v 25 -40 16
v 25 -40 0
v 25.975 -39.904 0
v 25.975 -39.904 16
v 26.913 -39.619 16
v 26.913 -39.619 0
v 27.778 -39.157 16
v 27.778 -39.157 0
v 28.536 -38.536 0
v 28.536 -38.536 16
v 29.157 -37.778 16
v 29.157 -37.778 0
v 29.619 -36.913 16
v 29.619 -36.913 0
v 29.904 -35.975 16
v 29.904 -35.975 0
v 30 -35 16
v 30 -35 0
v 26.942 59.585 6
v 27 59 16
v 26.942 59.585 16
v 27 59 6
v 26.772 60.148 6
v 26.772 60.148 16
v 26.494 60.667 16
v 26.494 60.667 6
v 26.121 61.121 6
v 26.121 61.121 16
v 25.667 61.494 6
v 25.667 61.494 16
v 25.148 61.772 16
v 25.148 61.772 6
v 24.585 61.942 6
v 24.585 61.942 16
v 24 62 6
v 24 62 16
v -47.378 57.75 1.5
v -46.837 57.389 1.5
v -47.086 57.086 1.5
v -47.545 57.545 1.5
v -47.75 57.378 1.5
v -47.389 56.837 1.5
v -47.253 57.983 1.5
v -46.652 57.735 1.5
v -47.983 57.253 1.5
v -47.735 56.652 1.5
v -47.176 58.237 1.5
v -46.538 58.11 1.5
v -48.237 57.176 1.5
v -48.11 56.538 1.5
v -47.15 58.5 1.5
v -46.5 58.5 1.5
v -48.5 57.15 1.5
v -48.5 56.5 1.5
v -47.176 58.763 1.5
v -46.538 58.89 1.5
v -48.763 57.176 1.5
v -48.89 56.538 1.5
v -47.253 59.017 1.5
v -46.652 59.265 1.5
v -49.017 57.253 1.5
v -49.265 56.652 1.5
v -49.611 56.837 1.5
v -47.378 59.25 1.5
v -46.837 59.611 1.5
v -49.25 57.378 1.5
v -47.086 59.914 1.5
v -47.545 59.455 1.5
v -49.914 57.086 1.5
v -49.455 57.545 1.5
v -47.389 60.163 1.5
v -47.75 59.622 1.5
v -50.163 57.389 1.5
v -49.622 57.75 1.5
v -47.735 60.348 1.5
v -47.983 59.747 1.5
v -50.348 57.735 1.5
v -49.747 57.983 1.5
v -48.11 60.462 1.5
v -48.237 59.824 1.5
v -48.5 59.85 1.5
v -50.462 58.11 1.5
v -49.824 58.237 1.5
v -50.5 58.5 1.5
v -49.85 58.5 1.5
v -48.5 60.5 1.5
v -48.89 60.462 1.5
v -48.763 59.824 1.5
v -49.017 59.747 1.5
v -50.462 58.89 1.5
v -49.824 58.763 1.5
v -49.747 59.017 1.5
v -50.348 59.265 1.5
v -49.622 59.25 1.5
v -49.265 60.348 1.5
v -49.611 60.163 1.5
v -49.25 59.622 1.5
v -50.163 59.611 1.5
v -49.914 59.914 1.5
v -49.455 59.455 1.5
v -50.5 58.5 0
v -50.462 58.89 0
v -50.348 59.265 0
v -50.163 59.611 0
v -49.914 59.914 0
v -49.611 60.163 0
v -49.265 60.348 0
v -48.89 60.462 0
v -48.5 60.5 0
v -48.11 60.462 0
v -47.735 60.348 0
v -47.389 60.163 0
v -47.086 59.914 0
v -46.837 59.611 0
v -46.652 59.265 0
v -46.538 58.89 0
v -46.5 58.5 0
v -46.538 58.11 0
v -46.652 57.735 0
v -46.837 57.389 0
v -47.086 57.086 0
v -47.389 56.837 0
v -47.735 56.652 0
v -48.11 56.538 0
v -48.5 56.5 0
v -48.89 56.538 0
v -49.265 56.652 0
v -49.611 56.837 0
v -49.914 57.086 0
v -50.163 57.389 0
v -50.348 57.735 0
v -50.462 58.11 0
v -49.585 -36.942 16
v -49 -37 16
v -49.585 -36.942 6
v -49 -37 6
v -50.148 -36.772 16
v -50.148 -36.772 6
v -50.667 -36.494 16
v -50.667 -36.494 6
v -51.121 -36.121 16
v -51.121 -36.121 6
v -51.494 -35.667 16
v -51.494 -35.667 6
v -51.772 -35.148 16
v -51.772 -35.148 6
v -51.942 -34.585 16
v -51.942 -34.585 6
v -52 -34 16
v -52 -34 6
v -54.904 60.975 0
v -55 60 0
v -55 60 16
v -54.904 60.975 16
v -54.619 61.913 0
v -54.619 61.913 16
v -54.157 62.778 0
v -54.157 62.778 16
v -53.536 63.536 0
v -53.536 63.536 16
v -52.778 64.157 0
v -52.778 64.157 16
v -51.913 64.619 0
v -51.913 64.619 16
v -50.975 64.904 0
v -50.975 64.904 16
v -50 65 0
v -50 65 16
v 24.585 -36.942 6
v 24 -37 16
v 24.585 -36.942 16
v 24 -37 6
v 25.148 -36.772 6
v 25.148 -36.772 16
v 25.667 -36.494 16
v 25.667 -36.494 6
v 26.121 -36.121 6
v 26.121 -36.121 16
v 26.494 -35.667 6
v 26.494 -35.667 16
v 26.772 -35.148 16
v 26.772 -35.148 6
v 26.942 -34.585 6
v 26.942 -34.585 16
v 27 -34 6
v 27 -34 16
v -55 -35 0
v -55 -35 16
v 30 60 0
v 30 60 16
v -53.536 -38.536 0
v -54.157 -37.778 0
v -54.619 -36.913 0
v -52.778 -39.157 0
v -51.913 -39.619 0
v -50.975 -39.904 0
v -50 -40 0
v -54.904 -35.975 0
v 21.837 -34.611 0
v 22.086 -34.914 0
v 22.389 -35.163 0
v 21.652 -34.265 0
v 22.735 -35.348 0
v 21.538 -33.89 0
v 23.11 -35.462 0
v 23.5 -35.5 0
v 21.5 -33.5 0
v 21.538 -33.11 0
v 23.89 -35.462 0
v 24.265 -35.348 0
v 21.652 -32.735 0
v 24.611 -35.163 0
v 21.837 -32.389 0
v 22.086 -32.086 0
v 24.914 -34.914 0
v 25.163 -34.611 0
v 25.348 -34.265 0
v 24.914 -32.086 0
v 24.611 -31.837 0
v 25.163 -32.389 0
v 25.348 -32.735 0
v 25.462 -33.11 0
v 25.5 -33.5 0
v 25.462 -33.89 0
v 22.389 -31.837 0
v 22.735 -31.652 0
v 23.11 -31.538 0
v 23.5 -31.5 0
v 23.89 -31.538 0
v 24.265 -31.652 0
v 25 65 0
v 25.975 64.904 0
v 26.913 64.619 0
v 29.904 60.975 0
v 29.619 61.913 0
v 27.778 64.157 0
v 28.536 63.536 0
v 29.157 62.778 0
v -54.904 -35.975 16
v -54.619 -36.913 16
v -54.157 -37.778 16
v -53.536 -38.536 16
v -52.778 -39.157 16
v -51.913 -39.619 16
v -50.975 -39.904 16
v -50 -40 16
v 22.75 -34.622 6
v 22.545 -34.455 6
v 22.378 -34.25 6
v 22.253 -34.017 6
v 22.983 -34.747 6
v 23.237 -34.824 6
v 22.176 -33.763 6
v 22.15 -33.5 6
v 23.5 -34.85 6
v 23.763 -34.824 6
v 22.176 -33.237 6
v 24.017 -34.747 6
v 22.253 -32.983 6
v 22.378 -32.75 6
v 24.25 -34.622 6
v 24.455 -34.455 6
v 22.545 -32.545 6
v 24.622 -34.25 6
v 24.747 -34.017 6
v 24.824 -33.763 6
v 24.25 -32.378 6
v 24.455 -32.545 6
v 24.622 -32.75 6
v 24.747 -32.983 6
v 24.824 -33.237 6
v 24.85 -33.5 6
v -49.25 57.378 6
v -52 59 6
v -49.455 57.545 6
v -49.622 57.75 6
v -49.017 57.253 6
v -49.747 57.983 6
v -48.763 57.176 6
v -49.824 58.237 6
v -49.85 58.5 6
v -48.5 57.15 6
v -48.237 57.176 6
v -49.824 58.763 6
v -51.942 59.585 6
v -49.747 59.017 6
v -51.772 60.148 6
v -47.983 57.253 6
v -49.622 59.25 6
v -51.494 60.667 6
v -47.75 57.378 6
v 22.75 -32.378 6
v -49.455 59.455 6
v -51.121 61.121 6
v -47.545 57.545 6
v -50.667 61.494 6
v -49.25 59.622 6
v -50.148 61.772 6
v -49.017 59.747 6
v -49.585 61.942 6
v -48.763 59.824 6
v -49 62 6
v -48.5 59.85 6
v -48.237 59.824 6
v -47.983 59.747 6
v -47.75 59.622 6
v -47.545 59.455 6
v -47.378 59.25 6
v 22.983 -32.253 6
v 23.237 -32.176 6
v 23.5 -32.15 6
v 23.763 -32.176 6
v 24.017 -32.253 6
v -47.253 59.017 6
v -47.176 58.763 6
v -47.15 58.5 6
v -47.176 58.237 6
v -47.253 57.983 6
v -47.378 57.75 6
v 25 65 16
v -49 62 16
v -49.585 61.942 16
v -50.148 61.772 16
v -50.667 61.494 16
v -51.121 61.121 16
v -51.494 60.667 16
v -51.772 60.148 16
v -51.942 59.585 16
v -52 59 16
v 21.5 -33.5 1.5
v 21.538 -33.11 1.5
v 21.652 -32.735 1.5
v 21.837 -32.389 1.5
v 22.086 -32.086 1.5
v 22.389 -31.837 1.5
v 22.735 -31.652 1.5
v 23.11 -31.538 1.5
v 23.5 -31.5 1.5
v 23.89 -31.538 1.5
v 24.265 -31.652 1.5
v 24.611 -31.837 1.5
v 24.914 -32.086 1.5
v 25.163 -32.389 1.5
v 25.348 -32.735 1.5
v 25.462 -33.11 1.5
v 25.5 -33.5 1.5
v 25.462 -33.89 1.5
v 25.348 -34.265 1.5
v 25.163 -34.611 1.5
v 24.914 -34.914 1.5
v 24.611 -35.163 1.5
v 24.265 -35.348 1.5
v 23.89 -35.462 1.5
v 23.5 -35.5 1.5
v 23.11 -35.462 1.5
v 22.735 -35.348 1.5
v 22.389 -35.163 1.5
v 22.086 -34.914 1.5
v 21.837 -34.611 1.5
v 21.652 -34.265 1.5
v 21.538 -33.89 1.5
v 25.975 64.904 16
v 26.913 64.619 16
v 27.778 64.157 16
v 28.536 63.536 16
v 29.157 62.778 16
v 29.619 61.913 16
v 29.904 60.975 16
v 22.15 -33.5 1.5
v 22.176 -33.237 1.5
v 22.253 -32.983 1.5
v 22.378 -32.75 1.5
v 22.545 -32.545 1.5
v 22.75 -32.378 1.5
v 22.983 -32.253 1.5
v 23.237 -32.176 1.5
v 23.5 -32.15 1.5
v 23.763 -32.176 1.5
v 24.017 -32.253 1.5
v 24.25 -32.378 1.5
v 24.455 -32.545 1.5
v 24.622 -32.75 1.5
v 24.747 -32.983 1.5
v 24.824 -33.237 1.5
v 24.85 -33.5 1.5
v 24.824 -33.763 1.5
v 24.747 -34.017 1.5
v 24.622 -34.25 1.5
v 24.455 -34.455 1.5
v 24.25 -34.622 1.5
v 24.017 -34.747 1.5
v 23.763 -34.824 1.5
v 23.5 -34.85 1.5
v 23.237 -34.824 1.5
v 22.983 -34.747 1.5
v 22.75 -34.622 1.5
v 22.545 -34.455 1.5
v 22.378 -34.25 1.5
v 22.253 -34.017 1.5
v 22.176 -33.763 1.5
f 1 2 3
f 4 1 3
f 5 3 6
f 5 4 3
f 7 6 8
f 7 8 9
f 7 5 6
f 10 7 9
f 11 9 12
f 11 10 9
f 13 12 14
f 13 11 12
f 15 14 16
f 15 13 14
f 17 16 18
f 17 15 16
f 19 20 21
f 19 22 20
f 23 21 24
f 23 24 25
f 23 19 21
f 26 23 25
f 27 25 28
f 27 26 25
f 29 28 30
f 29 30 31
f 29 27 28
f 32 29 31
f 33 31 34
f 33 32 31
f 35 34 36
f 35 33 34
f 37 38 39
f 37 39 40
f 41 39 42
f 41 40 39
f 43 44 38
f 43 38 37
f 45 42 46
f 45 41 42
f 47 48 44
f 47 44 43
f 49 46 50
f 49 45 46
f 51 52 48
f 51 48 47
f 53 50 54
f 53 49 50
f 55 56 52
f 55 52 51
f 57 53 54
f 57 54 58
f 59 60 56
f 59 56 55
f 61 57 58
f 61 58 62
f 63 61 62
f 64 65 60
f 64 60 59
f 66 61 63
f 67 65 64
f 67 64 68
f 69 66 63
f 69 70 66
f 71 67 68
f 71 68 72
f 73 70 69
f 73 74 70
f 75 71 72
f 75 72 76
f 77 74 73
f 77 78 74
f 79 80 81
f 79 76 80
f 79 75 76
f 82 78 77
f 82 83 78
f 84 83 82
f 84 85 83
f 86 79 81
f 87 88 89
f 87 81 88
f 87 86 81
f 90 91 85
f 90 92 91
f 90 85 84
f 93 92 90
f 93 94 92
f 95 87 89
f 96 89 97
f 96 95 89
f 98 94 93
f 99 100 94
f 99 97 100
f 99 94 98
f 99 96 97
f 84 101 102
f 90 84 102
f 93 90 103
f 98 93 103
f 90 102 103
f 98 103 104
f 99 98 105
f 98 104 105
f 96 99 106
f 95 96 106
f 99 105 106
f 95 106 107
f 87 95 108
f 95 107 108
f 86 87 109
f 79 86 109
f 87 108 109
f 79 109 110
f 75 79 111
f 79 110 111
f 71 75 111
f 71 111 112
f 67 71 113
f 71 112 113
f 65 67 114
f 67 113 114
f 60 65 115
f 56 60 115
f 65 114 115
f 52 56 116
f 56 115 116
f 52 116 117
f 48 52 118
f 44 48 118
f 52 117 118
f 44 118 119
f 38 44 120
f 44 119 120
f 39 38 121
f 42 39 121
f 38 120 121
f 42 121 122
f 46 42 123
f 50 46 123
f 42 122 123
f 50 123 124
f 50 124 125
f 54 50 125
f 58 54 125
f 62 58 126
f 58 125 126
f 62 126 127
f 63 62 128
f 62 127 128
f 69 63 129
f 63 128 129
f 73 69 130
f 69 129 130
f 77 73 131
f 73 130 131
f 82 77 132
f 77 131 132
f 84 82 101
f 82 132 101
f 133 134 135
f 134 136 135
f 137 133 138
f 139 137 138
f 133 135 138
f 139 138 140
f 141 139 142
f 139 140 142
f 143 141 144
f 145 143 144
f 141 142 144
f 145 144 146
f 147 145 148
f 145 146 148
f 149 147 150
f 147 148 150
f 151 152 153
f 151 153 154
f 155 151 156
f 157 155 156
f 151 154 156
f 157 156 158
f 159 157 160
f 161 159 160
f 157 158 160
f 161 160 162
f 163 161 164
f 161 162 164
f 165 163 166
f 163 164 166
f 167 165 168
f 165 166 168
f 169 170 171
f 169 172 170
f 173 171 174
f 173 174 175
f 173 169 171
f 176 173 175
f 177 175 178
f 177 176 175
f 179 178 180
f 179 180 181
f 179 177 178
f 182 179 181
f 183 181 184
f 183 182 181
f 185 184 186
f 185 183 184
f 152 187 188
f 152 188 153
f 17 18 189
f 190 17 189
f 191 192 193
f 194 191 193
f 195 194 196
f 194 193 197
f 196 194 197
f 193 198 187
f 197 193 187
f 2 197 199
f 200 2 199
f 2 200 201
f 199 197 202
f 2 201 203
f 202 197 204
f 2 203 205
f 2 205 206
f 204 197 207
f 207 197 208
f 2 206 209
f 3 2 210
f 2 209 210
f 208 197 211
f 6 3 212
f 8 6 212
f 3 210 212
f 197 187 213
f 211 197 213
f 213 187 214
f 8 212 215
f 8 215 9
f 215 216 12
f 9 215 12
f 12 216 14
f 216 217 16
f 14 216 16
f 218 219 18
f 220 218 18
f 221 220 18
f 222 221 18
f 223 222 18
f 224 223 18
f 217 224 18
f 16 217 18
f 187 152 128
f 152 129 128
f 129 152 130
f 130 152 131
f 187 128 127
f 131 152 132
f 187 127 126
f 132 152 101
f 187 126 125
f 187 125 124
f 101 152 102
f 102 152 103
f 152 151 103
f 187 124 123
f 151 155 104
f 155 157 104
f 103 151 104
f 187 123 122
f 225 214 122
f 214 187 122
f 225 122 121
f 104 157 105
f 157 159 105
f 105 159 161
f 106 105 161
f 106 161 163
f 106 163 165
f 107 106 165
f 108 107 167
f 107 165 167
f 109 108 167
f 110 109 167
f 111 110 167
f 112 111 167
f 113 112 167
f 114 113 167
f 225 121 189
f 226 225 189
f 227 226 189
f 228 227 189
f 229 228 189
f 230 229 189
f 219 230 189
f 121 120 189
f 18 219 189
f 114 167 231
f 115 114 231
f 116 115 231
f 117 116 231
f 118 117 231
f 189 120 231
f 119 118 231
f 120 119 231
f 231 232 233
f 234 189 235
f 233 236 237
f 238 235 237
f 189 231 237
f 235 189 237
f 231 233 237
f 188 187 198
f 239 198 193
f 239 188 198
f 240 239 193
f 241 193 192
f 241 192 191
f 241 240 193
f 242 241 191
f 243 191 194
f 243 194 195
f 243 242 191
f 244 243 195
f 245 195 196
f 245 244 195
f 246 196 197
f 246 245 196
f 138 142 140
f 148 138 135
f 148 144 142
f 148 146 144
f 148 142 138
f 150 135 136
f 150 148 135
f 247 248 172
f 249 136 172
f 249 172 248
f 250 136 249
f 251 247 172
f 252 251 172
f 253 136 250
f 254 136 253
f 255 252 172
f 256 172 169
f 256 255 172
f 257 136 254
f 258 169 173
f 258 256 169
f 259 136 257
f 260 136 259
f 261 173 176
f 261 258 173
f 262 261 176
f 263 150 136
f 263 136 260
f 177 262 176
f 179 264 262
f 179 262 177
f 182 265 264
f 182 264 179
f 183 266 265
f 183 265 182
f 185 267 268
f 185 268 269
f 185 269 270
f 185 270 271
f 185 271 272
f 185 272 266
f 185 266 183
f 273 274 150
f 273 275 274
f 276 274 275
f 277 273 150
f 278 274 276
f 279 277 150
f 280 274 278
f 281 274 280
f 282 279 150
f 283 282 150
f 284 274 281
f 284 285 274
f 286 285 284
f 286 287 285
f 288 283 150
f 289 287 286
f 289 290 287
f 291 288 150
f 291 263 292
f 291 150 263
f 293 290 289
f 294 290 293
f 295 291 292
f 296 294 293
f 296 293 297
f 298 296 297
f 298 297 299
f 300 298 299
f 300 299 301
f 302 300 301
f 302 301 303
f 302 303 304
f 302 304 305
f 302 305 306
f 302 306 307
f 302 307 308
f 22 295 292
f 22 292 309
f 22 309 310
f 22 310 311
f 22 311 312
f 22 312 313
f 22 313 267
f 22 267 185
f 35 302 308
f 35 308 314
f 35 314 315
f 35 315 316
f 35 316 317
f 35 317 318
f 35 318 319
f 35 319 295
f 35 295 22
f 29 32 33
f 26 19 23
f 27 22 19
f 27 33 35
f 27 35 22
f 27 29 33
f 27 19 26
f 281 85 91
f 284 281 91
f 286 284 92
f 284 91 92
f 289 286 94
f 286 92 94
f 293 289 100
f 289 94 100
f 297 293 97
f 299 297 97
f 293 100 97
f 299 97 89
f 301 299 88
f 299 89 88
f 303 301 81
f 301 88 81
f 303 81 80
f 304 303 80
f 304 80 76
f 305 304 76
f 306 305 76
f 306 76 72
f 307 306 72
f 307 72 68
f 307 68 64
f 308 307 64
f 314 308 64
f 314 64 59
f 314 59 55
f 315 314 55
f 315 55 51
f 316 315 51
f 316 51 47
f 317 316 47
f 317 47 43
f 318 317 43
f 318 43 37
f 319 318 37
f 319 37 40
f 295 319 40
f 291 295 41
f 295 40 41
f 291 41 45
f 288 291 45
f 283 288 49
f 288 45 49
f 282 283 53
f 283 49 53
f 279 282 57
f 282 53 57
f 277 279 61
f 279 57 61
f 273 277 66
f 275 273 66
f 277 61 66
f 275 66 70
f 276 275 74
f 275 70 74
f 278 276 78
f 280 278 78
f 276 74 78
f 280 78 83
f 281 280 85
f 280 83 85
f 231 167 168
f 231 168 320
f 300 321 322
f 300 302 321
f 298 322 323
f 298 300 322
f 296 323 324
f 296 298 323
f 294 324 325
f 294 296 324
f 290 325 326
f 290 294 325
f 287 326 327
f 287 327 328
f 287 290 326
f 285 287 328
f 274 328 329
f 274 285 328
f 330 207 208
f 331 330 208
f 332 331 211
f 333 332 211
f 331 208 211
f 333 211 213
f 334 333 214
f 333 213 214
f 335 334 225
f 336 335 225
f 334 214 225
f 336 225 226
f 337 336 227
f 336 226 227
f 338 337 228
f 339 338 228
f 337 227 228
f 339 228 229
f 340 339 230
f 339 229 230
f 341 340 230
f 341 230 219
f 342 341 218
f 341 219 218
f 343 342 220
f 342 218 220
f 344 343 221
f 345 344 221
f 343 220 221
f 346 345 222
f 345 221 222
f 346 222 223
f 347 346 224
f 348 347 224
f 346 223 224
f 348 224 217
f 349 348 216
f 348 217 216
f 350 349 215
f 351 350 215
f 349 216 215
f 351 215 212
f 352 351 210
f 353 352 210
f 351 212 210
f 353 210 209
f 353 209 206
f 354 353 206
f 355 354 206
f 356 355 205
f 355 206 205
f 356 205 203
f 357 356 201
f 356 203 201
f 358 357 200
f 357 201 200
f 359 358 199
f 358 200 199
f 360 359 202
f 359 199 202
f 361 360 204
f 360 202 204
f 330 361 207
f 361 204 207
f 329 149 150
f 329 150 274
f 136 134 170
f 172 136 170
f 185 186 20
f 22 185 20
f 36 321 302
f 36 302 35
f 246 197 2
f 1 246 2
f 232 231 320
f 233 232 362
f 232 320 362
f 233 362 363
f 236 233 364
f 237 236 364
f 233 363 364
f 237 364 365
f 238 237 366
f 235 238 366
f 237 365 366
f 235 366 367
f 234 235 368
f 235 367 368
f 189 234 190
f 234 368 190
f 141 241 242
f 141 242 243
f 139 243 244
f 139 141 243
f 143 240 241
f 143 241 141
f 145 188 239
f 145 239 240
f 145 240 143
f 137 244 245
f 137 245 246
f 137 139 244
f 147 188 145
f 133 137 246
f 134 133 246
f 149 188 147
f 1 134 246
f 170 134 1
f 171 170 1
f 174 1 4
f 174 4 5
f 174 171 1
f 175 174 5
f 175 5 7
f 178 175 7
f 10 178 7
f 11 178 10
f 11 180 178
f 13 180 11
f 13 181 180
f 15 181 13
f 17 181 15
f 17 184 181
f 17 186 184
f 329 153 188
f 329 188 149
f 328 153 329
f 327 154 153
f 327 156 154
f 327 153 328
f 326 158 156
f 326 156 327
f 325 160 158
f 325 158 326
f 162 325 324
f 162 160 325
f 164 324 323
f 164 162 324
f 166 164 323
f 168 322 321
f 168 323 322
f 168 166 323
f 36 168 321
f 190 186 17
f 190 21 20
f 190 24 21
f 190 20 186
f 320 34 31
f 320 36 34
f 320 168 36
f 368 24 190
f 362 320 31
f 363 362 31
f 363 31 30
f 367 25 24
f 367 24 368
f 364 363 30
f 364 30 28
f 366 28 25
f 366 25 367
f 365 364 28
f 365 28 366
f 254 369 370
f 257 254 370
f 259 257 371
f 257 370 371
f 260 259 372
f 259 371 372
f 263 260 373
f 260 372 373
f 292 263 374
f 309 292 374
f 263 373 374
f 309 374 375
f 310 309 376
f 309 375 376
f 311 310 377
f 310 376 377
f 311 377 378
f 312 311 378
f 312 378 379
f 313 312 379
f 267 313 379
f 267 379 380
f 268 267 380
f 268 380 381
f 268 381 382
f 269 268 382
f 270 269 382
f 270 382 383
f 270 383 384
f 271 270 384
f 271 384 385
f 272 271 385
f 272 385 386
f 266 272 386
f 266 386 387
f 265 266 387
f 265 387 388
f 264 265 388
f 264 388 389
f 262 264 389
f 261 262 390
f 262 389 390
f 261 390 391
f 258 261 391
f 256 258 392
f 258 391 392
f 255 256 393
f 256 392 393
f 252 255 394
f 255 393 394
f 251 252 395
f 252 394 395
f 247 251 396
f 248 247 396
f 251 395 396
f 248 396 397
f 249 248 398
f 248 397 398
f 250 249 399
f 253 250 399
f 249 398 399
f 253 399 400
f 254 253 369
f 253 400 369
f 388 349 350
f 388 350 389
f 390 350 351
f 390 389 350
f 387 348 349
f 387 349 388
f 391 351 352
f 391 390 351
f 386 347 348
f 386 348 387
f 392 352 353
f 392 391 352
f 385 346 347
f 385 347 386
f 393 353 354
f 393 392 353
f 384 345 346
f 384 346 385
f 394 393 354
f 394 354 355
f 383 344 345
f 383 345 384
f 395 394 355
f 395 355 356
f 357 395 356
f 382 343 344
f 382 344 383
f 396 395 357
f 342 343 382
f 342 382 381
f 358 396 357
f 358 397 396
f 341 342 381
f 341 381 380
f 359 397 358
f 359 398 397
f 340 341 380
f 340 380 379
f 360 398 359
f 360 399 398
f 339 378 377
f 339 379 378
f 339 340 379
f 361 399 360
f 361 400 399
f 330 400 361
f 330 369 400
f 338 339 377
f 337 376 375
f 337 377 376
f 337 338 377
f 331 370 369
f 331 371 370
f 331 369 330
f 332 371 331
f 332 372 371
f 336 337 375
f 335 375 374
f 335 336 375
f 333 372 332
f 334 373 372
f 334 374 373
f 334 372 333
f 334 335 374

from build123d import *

# Parameters (mm, degrees)
SKETCH1_W           = 85
SKETCH1_H           = 105
BOSS_EXTRUDE1_DEPTH = 16
SKETCH2_W           = 79
SKETCH2_H           = 99
CUT_EXTRUDE1_DEPTH  = 10
FILLET1_R           = 5
SKETCH3_R           = 2
CUT_EXTRUDE2_DEPTH  = 1.5
SKETCH4_R           = 1.35
CUT_EXTRUDE3_DEPTH  = 87.372738755
FILLET2_R           = 3


with BuildPart() as part:
    # Sketch1 → Boss-Extrude1 (new body)
    with BuildSketch(Plane.XY):
        with Locations((-12.5, 12.5)):
            Rectangle(SKETCH1_W, SKETCH1_H)
    extrude(amount=BOSS_EXTRUDE1_DEPTH)

    # Sketch2 → Cut-Extrude1 (cut)
    with BuildSketch(Plane.XY.offset(16)):
        with Locations((-12.5, 12.5)):
            Rectangle(SKETCH2_W, SKETCH2_H)
    extrude(amount=-CUT_EXTRUDE1_DEPTH, mode=Mode.SUBTRACT)

    # Fillet1
    fillet1_edges = [part.edges().sort_by_distance(p)[0] for p in [
        (-55, 65, 8),
        (30, 65, 8),
        (30, -40, 8),
        (-55, -40, 8),
    ]]
    fillet(fillet1_edges, radius=FILLET1_R)

    # Sketch3 → Cut-Extrude2 (cut)
    with BuildSketch(Plane(origin=(0, 0, 0), x_dir=(-1, 0, 0), z_dir=(0, 0, -1))):
        with Locations((48.5, 58.5)):
            Circle(SKETCH3_R)
        with Locations((-23.5, -33.5)):
            Circle(SKETCH3_R)
    extrude(amount=-CUT_EXTRUDE2_DEPTH, mode=Mode.SUBTRACT)

    # Sketch4 → Cut-Extrude3 (cut, through all)
    with BuildSketch(Plane(origin=(0, 0, 1.5), x_dir=(-1, 0, 0), z_dir=(0, 0, -1))):
        with Locations((48.5, 58.5)):
            Circle(SKETCH4_R)
        with Locations((-23.5, -33.5)):
            Circle(SKETCH4_R)
    extrude(amount=-CUT_EXTRUDE3_DEPTH, mode=Mode.SUBTRACT)

    # Fillet2
    fillet2_edges = [part.edges().sort_by_distance(p)[0] for p in [
        (-52, -37, 11),
        (-52, 62, 11),
        (27, 62, 11),
        (27, -37, 11),
    ]]
    fillet(fillet2_edges, radius=FILLET2_R)


solid = part.part
